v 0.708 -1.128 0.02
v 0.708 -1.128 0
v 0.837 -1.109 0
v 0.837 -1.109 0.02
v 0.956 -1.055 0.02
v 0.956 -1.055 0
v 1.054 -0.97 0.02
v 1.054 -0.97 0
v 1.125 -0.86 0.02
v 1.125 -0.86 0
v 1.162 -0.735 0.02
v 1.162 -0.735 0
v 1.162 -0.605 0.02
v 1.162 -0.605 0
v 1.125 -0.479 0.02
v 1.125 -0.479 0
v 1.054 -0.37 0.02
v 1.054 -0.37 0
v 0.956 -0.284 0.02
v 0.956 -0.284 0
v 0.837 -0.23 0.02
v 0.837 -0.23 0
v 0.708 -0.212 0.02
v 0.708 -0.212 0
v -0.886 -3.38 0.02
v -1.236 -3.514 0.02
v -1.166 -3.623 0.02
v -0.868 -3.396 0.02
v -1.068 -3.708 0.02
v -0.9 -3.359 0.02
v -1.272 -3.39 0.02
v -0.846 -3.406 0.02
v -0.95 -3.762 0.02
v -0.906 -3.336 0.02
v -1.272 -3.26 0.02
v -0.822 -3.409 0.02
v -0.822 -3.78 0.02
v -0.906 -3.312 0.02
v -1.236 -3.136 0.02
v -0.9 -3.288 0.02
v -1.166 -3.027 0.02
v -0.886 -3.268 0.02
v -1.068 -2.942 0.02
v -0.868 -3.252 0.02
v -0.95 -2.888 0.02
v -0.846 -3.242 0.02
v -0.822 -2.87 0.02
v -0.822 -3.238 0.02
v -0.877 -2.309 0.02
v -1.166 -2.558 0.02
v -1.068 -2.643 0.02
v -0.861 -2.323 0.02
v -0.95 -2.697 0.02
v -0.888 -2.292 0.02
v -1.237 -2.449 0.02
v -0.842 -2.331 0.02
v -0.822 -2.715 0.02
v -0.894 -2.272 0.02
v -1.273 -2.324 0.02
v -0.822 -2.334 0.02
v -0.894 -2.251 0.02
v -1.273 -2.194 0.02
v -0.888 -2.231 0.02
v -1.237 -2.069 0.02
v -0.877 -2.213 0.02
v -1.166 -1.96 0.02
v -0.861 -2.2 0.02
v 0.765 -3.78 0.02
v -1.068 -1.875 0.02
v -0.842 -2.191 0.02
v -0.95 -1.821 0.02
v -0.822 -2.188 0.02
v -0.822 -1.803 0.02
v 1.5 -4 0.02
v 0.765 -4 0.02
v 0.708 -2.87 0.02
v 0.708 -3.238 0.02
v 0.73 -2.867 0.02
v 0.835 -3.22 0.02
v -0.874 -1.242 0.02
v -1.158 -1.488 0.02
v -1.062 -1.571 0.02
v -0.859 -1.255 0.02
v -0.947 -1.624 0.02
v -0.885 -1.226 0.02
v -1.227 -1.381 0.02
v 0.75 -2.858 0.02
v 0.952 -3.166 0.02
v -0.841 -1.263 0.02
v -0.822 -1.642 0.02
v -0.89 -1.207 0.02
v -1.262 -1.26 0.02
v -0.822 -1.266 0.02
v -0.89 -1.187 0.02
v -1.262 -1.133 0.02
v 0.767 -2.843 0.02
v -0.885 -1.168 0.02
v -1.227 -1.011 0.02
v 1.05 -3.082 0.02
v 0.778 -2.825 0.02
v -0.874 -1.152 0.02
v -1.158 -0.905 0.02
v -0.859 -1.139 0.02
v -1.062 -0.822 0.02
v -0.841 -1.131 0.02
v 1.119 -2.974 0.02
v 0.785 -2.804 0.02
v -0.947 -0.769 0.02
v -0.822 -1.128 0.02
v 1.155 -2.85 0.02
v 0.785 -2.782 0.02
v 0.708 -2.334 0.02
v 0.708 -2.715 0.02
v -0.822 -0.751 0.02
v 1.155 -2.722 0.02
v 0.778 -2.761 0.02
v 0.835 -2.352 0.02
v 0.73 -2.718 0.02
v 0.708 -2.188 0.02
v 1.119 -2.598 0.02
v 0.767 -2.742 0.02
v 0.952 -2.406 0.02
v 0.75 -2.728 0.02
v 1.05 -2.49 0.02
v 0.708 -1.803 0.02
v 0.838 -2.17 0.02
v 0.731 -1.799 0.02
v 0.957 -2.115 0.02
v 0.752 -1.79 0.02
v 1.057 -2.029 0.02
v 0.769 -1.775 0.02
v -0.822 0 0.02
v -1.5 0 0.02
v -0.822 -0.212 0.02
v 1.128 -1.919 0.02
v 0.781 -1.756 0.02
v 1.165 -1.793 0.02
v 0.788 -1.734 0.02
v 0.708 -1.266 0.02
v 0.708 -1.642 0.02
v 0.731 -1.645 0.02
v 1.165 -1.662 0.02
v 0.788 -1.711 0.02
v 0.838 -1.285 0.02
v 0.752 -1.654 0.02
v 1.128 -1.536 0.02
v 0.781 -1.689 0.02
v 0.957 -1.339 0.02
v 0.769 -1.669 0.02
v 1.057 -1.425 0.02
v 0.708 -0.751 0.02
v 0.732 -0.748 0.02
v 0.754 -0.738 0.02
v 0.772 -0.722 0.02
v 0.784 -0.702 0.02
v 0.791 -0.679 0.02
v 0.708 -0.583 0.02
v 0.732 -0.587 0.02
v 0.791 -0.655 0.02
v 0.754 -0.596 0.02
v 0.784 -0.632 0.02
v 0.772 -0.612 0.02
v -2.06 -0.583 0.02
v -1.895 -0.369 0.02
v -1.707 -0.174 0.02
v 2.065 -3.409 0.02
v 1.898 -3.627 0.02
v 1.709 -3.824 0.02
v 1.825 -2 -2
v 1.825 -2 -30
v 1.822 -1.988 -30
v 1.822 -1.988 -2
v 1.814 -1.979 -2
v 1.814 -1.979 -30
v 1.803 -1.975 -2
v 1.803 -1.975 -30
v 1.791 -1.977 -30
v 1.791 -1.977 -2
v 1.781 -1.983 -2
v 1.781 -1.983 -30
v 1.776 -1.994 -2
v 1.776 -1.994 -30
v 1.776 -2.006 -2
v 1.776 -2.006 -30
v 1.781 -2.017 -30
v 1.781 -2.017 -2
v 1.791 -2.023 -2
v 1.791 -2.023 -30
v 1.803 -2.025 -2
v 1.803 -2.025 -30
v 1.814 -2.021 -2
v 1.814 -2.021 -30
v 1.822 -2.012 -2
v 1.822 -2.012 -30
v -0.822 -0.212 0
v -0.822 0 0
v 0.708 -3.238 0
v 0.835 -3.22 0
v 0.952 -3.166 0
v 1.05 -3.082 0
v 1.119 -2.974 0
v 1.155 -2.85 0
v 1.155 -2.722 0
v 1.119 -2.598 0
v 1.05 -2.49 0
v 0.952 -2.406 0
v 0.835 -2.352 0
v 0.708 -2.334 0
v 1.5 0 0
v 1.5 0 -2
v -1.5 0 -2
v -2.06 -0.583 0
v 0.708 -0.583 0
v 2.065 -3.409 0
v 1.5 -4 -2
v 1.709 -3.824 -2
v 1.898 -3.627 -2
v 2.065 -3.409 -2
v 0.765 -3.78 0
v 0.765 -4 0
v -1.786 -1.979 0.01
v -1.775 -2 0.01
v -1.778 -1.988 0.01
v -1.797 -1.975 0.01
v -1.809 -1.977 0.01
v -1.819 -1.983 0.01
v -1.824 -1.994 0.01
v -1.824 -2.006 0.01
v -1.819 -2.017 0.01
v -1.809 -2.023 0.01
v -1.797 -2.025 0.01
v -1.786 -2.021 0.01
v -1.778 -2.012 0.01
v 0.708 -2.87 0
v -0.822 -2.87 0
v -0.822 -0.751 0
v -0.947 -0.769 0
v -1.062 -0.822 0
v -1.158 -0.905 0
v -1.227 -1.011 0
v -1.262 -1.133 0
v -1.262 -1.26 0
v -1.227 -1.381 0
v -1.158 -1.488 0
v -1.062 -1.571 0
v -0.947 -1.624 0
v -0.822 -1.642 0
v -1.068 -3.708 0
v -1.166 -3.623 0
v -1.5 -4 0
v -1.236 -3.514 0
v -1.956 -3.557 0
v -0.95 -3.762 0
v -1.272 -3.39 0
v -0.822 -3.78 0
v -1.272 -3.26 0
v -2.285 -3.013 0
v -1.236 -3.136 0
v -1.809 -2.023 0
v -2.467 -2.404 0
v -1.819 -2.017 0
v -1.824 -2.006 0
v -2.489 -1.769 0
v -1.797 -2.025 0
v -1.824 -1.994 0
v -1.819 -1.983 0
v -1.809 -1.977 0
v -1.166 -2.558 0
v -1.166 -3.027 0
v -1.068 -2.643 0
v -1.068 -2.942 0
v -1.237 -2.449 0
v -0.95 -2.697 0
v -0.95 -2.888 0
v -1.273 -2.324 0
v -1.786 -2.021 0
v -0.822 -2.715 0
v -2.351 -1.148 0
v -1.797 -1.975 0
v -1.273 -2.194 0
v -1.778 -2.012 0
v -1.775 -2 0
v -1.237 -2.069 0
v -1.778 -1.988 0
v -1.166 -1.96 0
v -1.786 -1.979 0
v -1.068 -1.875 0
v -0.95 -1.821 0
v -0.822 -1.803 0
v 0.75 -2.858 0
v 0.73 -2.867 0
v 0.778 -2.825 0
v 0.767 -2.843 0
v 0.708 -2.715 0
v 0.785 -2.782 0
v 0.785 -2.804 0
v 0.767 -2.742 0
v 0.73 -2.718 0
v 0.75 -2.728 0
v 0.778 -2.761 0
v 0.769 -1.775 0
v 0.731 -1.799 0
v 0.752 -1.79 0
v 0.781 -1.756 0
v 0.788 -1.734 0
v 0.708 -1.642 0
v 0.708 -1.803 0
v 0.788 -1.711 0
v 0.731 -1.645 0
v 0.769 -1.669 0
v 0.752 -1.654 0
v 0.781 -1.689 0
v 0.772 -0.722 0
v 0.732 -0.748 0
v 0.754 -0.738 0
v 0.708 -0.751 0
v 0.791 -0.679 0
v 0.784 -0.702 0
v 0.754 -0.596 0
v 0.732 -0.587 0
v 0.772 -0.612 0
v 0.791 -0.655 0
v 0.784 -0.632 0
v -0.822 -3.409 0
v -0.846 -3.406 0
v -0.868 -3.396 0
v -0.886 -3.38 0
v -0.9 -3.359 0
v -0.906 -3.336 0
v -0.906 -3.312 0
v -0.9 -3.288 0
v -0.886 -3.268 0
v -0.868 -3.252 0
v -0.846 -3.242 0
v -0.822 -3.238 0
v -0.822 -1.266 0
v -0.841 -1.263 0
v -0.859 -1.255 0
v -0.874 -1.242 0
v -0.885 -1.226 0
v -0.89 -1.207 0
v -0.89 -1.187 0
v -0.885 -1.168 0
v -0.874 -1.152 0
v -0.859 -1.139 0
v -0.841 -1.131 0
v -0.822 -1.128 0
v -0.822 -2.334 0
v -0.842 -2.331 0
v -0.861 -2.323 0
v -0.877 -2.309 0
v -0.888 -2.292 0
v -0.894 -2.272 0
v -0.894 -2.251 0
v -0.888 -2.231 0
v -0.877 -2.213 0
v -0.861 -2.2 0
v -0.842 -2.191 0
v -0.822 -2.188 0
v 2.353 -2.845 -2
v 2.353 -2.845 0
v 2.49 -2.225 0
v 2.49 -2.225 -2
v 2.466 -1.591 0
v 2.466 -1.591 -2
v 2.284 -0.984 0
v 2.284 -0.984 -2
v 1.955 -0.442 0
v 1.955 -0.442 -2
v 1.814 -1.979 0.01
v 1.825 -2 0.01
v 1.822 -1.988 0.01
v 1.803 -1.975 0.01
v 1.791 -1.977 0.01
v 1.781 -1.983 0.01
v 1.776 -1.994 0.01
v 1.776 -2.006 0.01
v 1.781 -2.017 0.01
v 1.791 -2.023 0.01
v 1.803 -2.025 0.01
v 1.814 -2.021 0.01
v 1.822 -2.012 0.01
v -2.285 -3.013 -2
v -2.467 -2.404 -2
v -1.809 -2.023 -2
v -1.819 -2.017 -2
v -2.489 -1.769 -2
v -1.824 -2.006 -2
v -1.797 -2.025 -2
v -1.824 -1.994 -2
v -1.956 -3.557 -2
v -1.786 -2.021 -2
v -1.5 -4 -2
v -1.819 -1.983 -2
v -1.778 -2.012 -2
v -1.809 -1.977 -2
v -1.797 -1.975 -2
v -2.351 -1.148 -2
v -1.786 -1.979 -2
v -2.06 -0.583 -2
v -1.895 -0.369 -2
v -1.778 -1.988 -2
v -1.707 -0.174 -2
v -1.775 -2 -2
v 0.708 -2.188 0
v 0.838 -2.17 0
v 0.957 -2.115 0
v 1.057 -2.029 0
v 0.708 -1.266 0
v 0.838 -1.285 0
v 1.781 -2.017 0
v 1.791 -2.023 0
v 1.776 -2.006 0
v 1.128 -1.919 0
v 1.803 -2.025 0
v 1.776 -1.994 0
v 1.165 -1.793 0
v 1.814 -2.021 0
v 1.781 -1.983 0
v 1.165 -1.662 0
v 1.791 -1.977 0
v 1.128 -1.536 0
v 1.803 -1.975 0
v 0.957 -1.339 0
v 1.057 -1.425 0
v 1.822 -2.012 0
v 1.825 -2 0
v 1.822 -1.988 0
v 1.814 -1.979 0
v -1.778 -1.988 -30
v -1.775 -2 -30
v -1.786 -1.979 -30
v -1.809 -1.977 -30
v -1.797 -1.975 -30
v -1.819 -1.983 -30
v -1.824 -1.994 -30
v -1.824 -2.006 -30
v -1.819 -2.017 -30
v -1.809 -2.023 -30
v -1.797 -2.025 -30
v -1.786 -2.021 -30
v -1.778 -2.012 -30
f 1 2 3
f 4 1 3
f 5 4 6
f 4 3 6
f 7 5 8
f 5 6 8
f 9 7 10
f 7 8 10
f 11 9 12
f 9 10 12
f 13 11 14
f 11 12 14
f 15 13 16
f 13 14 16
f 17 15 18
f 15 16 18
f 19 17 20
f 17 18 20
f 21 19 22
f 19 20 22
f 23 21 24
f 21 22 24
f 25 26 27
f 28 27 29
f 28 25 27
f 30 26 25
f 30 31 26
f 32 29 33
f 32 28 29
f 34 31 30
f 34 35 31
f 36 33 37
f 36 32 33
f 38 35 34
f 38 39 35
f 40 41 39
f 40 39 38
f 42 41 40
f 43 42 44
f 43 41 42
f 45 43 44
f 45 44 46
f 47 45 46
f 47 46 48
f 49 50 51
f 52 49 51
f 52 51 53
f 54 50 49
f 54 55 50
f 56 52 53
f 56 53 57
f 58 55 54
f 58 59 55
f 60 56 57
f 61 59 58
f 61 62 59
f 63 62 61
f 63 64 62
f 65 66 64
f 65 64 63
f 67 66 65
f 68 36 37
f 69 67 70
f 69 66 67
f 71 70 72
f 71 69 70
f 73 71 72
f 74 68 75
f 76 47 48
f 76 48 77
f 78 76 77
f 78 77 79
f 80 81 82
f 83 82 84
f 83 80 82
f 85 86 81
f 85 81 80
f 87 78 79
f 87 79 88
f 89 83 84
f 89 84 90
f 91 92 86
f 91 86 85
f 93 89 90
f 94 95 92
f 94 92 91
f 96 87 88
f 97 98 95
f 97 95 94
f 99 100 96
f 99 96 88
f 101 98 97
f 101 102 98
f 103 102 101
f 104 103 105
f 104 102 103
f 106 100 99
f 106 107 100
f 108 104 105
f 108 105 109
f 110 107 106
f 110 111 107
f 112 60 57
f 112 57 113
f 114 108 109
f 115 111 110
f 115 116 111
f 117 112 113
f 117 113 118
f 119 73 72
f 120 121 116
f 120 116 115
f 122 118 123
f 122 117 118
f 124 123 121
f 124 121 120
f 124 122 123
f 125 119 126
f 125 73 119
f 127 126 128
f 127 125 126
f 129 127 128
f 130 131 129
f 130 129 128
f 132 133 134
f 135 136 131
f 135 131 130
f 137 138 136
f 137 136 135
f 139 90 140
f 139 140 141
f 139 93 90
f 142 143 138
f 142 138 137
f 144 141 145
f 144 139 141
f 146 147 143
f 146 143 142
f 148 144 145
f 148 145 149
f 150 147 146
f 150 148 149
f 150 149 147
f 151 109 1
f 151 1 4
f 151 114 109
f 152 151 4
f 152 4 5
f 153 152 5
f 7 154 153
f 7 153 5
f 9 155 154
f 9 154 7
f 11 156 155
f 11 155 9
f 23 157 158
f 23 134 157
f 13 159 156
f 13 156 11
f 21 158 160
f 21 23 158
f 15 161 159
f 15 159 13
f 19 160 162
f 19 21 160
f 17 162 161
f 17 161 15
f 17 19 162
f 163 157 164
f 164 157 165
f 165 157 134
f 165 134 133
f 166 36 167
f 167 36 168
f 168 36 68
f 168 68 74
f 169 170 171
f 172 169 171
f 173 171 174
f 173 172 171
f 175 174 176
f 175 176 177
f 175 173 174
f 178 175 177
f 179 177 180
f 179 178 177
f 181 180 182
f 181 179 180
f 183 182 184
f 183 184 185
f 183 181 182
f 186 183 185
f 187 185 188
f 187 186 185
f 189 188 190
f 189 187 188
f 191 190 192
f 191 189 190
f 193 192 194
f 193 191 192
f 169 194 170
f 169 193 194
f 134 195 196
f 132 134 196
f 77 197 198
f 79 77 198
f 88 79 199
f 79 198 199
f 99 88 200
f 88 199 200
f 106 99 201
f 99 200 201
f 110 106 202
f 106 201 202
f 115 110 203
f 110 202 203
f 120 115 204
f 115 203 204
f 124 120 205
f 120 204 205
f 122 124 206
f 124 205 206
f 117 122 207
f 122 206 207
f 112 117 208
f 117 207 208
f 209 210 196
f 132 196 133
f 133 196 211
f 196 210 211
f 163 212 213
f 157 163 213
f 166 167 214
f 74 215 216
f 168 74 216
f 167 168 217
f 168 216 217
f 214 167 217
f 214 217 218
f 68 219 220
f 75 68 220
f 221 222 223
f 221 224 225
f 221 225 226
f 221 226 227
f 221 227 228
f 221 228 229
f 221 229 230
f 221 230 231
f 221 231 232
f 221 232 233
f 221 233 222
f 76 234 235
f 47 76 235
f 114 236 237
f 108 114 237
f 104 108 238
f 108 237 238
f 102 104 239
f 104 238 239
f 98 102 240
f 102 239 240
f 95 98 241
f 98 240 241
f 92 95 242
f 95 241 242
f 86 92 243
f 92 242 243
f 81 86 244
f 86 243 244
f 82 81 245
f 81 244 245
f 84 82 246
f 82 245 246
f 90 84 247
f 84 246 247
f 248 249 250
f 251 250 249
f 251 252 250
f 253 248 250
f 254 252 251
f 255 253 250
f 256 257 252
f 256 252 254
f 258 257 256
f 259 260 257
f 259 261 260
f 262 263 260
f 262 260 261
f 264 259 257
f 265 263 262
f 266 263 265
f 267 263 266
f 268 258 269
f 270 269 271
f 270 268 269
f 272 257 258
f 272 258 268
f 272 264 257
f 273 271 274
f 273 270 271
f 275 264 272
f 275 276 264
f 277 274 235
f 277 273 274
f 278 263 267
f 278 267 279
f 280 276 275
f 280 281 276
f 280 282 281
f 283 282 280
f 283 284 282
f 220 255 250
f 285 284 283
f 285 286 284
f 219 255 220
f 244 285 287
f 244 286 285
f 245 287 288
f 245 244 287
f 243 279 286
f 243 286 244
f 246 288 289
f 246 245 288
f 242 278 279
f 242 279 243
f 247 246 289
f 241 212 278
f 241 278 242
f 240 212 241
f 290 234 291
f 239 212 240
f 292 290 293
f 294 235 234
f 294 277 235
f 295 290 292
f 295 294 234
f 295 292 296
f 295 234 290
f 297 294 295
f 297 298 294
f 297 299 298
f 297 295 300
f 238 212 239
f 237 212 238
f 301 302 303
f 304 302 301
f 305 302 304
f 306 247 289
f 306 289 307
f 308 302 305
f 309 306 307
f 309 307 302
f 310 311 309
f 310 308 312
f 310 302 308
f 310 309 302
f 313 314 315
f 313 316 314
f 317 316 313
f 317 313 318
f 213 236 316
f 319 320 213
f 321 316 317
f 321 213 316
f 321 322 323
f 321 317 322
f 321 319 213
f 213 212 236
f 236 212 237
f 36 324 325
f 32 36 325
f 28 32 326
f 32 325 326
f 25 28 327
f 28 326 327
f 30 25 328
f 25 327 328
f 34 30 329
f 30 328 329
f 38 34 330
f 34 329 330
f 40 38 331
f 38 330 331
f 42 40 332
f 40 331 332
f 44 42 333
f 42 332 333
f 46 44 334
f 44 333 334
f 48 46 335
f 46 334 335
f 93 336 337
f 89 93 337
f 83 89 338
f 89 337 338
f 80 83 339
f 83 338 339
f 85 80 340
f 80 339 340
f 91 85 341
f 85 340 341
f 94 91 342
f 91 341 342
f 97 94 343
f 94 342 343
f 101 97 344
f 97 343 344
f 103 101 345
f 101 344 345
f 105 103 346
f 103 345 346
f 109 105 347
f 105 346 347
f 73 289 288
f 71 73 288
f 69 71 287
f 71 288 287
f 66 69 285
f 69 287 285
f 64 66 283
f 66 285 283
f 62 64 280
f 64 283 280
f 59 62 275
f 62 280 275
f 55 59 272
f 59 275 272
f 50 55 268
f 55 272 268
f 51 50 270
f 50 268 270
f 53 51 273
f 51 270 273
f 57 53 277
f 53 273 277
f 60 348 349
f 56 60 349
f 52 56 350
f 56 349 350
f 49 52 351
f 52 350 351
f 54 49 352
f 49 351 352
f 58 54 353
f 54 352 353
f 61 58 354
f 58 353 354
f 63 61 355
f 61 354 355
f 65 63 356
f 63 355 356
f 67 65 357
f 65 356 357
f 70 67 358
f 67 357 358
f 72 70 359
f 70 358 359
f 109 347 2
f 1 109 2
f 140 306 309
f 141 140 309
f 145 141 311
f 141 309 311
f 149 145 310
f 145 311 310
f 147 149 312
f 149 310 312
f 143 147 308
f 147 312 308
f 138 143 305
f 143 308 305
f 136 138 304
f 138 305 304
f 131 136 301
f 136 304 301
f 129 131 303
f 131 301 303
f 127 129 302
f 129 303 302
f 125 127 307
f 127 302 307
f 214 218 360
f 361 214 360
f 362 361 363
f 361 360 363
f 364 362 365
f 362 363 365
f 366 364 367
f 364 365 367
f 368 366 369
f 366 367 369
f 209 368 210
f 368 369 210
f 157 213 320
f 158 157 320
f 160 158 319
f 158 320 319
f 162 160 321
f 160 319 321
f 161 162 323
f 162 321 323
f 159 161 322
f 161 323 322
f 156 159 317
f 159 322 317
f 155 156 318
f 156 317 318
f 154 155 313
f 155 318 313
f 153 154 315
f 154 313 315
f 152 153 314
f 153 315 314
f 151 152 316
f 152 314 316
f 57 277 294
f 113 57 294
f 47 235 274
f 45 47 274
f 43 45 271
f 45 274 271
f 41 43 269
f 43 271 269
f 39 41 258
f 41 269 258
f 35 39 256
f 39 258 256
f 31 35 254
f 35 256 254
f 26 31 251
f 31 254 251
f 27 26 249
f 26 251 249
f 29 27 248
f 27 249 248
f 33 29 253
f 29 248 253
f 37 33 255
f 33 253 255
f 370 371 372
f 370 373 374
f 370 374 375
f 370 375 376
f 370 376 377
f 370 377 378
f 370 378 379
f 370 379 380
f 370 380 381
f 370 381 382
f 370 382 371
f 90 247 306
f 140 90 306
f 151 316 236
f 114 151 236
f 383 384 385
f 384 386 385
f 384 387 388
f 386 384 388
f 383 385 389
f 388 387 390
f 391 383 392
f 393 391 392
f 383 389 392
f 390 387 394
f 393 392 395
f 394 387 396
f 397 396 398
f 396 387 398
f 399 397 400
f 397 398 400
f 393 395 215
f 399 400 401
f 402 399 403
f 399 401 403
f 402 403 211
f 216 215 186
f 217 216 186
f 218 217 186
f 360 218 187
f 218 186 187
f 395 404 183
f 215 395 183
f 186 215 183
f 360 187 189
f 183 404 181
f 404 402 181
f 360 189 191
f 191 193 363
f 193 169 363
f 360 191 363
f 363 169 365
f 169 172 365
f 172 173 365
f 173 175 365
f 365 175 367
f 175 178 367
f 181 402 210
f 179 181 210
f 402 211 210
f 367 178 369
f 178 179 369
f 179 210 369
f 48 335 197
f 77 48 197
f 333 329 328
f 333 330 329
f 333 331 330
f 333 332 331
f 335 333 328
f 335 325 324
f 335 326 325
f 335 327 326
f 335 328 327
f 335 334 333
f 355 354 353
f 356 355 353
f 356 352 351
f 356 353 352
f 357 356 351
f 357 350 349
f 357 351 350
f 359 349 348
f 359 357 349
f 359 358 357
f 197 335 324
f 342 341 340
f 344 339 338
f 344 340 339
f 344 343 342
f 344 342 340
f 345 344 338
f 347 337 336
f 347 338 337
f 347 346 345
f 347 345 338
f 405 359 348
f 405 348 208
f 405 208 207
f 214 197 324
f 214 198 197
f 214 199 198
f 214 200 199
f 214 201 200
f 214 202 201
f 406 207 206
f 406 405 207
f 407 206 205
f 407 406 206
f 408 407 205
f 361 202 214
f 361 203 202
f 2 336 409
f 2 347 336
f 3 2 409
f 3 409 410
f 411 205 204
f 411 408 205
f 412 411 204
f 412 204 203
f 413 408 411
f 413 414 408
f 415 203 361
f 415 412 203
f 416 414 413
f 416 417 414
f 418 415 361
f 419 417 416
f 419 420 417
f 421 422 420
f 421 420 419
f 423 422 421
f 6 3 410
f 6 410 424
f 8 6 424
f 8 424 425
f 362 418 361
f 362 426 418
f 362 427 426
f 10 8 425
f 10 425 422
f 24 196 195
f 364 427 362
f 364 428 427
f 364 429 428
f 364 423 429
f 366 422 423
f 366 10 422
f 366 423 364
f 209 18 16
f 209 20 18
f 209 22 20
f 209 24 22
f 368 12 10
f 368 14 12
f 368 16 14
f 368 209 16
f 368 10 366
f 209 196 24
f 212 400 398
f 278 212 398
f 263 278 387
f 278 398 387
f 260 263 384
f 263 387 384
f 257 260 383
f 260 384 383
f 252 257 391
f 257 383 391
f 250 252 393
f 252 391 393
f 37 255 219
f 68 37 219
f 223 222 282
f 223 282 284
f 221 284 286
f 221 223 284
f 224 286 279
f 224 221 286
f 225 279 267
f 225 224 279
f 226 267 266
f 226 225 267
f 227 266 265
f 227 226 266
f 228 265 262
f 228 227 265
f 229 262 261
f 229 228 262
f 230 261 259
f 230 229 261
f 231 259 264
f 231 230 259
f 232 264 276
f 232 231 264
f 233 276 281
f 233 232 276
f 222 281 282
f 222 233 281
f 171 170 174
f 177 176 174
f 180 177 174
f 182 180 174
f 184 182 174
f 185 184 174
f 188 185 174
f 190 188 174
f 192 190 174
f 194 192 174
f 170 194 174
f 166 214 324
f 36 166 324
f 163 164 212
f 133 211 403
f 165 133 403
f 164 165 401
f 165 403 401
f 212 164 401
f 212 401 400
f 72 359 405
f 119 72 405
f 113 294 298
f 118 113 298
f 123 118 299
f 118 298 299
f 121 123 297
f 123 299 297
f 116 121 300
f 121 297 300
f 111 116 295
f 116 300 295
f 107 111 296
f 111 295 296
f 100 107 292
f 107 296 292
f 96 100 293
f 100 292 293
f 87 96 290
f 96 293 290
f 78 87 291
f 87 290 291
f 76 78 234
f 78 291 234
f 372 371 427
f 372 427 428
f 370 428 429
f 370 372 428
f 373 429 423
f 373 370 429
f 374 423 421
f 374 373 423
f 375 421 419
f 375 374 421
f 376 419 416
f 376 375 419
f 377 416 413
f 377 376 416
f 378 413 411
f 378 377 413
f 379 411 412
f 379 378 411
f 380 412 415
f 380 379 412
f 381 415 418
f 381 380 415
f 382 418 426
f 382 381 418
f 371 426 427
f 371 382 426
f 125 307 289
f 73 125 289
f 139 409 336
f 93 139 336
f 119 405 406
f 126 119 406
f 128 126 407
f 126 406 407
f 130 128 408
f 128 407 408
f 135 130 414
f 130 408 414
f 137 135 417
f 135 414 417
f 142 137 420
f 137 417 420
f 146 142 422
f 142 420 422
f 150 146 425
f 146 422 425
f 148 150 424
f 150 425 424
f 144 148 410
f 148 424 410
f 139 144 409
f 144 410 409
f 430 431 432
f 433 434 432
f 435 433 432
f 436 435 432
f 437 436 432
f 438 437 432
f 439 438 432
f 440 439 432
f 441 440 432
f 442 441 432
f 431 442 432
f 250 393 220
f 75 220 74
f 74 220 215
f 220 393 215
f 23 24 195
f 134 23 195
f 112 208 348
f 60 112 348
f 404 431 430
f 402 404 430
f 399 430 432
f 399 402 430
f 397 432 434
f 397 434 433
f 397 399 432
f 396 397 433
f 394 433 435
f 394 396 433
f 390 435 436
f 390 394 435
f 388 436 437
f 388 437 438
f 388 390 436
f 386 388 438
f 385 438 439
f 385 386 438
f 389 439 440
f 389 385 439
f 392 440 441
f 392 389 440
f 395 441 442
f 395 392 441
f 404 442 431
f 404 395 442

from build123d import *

# Parameters (mm, degrees)
SALIENTE_EXTRUIR3_DEPTH = 0.02
SALIENTE_EXTRUIR5_START = -2
SALIENTE_EXTRUIR5_DEPTH = 2
CROQUIS4_R              = 0.025
SALIENTE_EXTRUIR6_DEPTH = 30
SALIENTE_EXTRUIR7_START = 0.01
CROQUIS4_2_R            = 0.025
SALIENTE_EXTRUIR7_DEPTH = 0.01


with BuildPart() as part:
    # Croquis1 → Saliente-Extruir3 (new body)
    with BuildSketch(Plane.XY):
        with BuildLine():
            Line((-0.821642524, 0), (-1.5, 0))
            ThreePointArc((-1.5, 0), (-1.803592236, -0.268799536), (-2.059736596, -0.583142508))
            Line((-2.059736596, -0.583142508), (-0.821642524, -0.583142508))
            Line((-0.821642524, -0.583142508), (0.708153247, -0.583142508))
            ThreePointArc((0.708153247, -0.583142508), (0.792032388, -0.667021649), (0.708153247, -0.75090079))
            Line((0.708153247, -0.75090079), (-0.821642524, -0.75090079))
            ThreePointArc((-0.821642524, -0.75090079), (-1.266985163, -1.19624343), (-0.821642524, -1.641586069))
            Line((-0.821642524, -1.641586069), (0.708153247, -1.641586069))
            ThreePointArc((0.708153247, -1.641586069), (0.788738621, -1.722171443), (0.708153247, -1.802756818))
            Line((0.708153247, -1.802756818), (-0.821642524, -1.802756818))
            ThreePointArc((-0.821642524, -1.802756818), (-1.277929981, -2.259044275), (-0.821642524, -2.715331733))
            Line((-0.821642524, -2.715331733), (0.708153247, -2.715331733))
            ThreePointArc((0.708153247, -2.715331733), (0.785471646, -2.792650132), (0.708153247, -2.869968532))
            Line((0.708153247, -2.869968532), (-0.821642524, -2.869968532))
            ThreePointArc((-0.821642524, -2.869968532), (-1.276795627, -3.325121635), (-0.821642524, -3.780274738))
            Line((-0.821642524, -3.780274738), (0.764779262, -3.780274738))
            Line((0.764779262, -3.780274738), (0.764779262, -4))
            Line((0.764779262, -4), (1.5, -4))
            ThreePointArc((1.5, -4), (1.806680275, -3.727977542), (2.064782817, -3.409493497))
            Line((2.064782817, -3.409493497), (-0.821642524, -3.409493497))
            ThreePointArc((-0.821642524, -3.409493497), (-0.907365435, -3.323770586), (-0.821642524, -3.238047675))
            Line((-0.821642524, -3.238047675), (0.708153247, -3.238047675))
            ThreePointArc((0.708153247, -3.238047675), (1.160084738, -2.786116183), (0.708153247, -2.334184692))
            Line((0.708153247, -2.334184692), (-0.821642524, -2.334184692))
            ThreePointArc((-0.821642524, -2.334184692), (-0.894604957, -2.261222258), (-0.821642524, -2.188259825))
            Line((-0.821642524, -2.188259825), (0.708153247, -2.188259825))
            ThreePointArc((0.708153247, -2.188259825), (1.169203972, -1.727209099), (0.708153247, -1.266158374))
            Line((0.708153247, -1.266158374), (-0.821642524, -1.266158374))
            ThreePointArc((-0.821642524, -1.266158374), (-0.890869473, -1.196931424), (-0.821642524, -1.127704475))
            Line((-0.821642524, -1.127704475), (0.708153247, -1.127704475))
            ThreePointArc((0.708153247, -1.127704475), (1.166166615, -0.669691107), (0.708153247, -0.211677738))
            Line((0.708153247, -0.211677738), (-0.821642524, -0.211677738))
            Line((-0.821642524, -0.211677738), (-0.821642524, 0))
        make_face()
    extrude(amount=SALIENTE_EXTRUIR3_DEPTH)

    # Croquis1<5> → Saliente-Extruir5 (add)
    with BuildSketch(Plane.XY.offset(SALIENTE_EXTRUIR5_START)):
        with BuildLine():
            ThreePointArc((-1.5, 0), (-2.5, -2), (-1.5, -4))
            Line((-1.5, -4), (1.5, -4))
            ThreePointArc((1.5, -4), (2.5, -2), (1.5, 0))
            Line((1.5, 0), (-1.5, 0))
        make_face()
    extrude(amount=SALIENTE_EXTRUIR5_DEPTH)

    # Croquis4 → Saliente-Extruir6 (add)
    with BuildSketch(Plane.XY):
        with Locations((1.8, -2)):
            Circle(CROQUIS4_R)
        with Locations((-1.8, -2)):
            Circle(CROQUIS4_R)
    extrude(amount=-SALIENTE_EXTRUIR6_DEPTH)

    # Croquis4<2> → Saliente-Extruir7 (add)
    with BuildSketch(Plane.XY.offset(SALIENTE_EXTRUIR7_START)):
        with Locations((1.8, -2)):
            Circle(CROQUIS4_2_R)
        with Locations((-1.8, -2)):
            Circle(CROQUIS4_2_R)
    extrude(amount=-SALIENTE_EXTRUIR7_DEPTH)


solid = part.part
